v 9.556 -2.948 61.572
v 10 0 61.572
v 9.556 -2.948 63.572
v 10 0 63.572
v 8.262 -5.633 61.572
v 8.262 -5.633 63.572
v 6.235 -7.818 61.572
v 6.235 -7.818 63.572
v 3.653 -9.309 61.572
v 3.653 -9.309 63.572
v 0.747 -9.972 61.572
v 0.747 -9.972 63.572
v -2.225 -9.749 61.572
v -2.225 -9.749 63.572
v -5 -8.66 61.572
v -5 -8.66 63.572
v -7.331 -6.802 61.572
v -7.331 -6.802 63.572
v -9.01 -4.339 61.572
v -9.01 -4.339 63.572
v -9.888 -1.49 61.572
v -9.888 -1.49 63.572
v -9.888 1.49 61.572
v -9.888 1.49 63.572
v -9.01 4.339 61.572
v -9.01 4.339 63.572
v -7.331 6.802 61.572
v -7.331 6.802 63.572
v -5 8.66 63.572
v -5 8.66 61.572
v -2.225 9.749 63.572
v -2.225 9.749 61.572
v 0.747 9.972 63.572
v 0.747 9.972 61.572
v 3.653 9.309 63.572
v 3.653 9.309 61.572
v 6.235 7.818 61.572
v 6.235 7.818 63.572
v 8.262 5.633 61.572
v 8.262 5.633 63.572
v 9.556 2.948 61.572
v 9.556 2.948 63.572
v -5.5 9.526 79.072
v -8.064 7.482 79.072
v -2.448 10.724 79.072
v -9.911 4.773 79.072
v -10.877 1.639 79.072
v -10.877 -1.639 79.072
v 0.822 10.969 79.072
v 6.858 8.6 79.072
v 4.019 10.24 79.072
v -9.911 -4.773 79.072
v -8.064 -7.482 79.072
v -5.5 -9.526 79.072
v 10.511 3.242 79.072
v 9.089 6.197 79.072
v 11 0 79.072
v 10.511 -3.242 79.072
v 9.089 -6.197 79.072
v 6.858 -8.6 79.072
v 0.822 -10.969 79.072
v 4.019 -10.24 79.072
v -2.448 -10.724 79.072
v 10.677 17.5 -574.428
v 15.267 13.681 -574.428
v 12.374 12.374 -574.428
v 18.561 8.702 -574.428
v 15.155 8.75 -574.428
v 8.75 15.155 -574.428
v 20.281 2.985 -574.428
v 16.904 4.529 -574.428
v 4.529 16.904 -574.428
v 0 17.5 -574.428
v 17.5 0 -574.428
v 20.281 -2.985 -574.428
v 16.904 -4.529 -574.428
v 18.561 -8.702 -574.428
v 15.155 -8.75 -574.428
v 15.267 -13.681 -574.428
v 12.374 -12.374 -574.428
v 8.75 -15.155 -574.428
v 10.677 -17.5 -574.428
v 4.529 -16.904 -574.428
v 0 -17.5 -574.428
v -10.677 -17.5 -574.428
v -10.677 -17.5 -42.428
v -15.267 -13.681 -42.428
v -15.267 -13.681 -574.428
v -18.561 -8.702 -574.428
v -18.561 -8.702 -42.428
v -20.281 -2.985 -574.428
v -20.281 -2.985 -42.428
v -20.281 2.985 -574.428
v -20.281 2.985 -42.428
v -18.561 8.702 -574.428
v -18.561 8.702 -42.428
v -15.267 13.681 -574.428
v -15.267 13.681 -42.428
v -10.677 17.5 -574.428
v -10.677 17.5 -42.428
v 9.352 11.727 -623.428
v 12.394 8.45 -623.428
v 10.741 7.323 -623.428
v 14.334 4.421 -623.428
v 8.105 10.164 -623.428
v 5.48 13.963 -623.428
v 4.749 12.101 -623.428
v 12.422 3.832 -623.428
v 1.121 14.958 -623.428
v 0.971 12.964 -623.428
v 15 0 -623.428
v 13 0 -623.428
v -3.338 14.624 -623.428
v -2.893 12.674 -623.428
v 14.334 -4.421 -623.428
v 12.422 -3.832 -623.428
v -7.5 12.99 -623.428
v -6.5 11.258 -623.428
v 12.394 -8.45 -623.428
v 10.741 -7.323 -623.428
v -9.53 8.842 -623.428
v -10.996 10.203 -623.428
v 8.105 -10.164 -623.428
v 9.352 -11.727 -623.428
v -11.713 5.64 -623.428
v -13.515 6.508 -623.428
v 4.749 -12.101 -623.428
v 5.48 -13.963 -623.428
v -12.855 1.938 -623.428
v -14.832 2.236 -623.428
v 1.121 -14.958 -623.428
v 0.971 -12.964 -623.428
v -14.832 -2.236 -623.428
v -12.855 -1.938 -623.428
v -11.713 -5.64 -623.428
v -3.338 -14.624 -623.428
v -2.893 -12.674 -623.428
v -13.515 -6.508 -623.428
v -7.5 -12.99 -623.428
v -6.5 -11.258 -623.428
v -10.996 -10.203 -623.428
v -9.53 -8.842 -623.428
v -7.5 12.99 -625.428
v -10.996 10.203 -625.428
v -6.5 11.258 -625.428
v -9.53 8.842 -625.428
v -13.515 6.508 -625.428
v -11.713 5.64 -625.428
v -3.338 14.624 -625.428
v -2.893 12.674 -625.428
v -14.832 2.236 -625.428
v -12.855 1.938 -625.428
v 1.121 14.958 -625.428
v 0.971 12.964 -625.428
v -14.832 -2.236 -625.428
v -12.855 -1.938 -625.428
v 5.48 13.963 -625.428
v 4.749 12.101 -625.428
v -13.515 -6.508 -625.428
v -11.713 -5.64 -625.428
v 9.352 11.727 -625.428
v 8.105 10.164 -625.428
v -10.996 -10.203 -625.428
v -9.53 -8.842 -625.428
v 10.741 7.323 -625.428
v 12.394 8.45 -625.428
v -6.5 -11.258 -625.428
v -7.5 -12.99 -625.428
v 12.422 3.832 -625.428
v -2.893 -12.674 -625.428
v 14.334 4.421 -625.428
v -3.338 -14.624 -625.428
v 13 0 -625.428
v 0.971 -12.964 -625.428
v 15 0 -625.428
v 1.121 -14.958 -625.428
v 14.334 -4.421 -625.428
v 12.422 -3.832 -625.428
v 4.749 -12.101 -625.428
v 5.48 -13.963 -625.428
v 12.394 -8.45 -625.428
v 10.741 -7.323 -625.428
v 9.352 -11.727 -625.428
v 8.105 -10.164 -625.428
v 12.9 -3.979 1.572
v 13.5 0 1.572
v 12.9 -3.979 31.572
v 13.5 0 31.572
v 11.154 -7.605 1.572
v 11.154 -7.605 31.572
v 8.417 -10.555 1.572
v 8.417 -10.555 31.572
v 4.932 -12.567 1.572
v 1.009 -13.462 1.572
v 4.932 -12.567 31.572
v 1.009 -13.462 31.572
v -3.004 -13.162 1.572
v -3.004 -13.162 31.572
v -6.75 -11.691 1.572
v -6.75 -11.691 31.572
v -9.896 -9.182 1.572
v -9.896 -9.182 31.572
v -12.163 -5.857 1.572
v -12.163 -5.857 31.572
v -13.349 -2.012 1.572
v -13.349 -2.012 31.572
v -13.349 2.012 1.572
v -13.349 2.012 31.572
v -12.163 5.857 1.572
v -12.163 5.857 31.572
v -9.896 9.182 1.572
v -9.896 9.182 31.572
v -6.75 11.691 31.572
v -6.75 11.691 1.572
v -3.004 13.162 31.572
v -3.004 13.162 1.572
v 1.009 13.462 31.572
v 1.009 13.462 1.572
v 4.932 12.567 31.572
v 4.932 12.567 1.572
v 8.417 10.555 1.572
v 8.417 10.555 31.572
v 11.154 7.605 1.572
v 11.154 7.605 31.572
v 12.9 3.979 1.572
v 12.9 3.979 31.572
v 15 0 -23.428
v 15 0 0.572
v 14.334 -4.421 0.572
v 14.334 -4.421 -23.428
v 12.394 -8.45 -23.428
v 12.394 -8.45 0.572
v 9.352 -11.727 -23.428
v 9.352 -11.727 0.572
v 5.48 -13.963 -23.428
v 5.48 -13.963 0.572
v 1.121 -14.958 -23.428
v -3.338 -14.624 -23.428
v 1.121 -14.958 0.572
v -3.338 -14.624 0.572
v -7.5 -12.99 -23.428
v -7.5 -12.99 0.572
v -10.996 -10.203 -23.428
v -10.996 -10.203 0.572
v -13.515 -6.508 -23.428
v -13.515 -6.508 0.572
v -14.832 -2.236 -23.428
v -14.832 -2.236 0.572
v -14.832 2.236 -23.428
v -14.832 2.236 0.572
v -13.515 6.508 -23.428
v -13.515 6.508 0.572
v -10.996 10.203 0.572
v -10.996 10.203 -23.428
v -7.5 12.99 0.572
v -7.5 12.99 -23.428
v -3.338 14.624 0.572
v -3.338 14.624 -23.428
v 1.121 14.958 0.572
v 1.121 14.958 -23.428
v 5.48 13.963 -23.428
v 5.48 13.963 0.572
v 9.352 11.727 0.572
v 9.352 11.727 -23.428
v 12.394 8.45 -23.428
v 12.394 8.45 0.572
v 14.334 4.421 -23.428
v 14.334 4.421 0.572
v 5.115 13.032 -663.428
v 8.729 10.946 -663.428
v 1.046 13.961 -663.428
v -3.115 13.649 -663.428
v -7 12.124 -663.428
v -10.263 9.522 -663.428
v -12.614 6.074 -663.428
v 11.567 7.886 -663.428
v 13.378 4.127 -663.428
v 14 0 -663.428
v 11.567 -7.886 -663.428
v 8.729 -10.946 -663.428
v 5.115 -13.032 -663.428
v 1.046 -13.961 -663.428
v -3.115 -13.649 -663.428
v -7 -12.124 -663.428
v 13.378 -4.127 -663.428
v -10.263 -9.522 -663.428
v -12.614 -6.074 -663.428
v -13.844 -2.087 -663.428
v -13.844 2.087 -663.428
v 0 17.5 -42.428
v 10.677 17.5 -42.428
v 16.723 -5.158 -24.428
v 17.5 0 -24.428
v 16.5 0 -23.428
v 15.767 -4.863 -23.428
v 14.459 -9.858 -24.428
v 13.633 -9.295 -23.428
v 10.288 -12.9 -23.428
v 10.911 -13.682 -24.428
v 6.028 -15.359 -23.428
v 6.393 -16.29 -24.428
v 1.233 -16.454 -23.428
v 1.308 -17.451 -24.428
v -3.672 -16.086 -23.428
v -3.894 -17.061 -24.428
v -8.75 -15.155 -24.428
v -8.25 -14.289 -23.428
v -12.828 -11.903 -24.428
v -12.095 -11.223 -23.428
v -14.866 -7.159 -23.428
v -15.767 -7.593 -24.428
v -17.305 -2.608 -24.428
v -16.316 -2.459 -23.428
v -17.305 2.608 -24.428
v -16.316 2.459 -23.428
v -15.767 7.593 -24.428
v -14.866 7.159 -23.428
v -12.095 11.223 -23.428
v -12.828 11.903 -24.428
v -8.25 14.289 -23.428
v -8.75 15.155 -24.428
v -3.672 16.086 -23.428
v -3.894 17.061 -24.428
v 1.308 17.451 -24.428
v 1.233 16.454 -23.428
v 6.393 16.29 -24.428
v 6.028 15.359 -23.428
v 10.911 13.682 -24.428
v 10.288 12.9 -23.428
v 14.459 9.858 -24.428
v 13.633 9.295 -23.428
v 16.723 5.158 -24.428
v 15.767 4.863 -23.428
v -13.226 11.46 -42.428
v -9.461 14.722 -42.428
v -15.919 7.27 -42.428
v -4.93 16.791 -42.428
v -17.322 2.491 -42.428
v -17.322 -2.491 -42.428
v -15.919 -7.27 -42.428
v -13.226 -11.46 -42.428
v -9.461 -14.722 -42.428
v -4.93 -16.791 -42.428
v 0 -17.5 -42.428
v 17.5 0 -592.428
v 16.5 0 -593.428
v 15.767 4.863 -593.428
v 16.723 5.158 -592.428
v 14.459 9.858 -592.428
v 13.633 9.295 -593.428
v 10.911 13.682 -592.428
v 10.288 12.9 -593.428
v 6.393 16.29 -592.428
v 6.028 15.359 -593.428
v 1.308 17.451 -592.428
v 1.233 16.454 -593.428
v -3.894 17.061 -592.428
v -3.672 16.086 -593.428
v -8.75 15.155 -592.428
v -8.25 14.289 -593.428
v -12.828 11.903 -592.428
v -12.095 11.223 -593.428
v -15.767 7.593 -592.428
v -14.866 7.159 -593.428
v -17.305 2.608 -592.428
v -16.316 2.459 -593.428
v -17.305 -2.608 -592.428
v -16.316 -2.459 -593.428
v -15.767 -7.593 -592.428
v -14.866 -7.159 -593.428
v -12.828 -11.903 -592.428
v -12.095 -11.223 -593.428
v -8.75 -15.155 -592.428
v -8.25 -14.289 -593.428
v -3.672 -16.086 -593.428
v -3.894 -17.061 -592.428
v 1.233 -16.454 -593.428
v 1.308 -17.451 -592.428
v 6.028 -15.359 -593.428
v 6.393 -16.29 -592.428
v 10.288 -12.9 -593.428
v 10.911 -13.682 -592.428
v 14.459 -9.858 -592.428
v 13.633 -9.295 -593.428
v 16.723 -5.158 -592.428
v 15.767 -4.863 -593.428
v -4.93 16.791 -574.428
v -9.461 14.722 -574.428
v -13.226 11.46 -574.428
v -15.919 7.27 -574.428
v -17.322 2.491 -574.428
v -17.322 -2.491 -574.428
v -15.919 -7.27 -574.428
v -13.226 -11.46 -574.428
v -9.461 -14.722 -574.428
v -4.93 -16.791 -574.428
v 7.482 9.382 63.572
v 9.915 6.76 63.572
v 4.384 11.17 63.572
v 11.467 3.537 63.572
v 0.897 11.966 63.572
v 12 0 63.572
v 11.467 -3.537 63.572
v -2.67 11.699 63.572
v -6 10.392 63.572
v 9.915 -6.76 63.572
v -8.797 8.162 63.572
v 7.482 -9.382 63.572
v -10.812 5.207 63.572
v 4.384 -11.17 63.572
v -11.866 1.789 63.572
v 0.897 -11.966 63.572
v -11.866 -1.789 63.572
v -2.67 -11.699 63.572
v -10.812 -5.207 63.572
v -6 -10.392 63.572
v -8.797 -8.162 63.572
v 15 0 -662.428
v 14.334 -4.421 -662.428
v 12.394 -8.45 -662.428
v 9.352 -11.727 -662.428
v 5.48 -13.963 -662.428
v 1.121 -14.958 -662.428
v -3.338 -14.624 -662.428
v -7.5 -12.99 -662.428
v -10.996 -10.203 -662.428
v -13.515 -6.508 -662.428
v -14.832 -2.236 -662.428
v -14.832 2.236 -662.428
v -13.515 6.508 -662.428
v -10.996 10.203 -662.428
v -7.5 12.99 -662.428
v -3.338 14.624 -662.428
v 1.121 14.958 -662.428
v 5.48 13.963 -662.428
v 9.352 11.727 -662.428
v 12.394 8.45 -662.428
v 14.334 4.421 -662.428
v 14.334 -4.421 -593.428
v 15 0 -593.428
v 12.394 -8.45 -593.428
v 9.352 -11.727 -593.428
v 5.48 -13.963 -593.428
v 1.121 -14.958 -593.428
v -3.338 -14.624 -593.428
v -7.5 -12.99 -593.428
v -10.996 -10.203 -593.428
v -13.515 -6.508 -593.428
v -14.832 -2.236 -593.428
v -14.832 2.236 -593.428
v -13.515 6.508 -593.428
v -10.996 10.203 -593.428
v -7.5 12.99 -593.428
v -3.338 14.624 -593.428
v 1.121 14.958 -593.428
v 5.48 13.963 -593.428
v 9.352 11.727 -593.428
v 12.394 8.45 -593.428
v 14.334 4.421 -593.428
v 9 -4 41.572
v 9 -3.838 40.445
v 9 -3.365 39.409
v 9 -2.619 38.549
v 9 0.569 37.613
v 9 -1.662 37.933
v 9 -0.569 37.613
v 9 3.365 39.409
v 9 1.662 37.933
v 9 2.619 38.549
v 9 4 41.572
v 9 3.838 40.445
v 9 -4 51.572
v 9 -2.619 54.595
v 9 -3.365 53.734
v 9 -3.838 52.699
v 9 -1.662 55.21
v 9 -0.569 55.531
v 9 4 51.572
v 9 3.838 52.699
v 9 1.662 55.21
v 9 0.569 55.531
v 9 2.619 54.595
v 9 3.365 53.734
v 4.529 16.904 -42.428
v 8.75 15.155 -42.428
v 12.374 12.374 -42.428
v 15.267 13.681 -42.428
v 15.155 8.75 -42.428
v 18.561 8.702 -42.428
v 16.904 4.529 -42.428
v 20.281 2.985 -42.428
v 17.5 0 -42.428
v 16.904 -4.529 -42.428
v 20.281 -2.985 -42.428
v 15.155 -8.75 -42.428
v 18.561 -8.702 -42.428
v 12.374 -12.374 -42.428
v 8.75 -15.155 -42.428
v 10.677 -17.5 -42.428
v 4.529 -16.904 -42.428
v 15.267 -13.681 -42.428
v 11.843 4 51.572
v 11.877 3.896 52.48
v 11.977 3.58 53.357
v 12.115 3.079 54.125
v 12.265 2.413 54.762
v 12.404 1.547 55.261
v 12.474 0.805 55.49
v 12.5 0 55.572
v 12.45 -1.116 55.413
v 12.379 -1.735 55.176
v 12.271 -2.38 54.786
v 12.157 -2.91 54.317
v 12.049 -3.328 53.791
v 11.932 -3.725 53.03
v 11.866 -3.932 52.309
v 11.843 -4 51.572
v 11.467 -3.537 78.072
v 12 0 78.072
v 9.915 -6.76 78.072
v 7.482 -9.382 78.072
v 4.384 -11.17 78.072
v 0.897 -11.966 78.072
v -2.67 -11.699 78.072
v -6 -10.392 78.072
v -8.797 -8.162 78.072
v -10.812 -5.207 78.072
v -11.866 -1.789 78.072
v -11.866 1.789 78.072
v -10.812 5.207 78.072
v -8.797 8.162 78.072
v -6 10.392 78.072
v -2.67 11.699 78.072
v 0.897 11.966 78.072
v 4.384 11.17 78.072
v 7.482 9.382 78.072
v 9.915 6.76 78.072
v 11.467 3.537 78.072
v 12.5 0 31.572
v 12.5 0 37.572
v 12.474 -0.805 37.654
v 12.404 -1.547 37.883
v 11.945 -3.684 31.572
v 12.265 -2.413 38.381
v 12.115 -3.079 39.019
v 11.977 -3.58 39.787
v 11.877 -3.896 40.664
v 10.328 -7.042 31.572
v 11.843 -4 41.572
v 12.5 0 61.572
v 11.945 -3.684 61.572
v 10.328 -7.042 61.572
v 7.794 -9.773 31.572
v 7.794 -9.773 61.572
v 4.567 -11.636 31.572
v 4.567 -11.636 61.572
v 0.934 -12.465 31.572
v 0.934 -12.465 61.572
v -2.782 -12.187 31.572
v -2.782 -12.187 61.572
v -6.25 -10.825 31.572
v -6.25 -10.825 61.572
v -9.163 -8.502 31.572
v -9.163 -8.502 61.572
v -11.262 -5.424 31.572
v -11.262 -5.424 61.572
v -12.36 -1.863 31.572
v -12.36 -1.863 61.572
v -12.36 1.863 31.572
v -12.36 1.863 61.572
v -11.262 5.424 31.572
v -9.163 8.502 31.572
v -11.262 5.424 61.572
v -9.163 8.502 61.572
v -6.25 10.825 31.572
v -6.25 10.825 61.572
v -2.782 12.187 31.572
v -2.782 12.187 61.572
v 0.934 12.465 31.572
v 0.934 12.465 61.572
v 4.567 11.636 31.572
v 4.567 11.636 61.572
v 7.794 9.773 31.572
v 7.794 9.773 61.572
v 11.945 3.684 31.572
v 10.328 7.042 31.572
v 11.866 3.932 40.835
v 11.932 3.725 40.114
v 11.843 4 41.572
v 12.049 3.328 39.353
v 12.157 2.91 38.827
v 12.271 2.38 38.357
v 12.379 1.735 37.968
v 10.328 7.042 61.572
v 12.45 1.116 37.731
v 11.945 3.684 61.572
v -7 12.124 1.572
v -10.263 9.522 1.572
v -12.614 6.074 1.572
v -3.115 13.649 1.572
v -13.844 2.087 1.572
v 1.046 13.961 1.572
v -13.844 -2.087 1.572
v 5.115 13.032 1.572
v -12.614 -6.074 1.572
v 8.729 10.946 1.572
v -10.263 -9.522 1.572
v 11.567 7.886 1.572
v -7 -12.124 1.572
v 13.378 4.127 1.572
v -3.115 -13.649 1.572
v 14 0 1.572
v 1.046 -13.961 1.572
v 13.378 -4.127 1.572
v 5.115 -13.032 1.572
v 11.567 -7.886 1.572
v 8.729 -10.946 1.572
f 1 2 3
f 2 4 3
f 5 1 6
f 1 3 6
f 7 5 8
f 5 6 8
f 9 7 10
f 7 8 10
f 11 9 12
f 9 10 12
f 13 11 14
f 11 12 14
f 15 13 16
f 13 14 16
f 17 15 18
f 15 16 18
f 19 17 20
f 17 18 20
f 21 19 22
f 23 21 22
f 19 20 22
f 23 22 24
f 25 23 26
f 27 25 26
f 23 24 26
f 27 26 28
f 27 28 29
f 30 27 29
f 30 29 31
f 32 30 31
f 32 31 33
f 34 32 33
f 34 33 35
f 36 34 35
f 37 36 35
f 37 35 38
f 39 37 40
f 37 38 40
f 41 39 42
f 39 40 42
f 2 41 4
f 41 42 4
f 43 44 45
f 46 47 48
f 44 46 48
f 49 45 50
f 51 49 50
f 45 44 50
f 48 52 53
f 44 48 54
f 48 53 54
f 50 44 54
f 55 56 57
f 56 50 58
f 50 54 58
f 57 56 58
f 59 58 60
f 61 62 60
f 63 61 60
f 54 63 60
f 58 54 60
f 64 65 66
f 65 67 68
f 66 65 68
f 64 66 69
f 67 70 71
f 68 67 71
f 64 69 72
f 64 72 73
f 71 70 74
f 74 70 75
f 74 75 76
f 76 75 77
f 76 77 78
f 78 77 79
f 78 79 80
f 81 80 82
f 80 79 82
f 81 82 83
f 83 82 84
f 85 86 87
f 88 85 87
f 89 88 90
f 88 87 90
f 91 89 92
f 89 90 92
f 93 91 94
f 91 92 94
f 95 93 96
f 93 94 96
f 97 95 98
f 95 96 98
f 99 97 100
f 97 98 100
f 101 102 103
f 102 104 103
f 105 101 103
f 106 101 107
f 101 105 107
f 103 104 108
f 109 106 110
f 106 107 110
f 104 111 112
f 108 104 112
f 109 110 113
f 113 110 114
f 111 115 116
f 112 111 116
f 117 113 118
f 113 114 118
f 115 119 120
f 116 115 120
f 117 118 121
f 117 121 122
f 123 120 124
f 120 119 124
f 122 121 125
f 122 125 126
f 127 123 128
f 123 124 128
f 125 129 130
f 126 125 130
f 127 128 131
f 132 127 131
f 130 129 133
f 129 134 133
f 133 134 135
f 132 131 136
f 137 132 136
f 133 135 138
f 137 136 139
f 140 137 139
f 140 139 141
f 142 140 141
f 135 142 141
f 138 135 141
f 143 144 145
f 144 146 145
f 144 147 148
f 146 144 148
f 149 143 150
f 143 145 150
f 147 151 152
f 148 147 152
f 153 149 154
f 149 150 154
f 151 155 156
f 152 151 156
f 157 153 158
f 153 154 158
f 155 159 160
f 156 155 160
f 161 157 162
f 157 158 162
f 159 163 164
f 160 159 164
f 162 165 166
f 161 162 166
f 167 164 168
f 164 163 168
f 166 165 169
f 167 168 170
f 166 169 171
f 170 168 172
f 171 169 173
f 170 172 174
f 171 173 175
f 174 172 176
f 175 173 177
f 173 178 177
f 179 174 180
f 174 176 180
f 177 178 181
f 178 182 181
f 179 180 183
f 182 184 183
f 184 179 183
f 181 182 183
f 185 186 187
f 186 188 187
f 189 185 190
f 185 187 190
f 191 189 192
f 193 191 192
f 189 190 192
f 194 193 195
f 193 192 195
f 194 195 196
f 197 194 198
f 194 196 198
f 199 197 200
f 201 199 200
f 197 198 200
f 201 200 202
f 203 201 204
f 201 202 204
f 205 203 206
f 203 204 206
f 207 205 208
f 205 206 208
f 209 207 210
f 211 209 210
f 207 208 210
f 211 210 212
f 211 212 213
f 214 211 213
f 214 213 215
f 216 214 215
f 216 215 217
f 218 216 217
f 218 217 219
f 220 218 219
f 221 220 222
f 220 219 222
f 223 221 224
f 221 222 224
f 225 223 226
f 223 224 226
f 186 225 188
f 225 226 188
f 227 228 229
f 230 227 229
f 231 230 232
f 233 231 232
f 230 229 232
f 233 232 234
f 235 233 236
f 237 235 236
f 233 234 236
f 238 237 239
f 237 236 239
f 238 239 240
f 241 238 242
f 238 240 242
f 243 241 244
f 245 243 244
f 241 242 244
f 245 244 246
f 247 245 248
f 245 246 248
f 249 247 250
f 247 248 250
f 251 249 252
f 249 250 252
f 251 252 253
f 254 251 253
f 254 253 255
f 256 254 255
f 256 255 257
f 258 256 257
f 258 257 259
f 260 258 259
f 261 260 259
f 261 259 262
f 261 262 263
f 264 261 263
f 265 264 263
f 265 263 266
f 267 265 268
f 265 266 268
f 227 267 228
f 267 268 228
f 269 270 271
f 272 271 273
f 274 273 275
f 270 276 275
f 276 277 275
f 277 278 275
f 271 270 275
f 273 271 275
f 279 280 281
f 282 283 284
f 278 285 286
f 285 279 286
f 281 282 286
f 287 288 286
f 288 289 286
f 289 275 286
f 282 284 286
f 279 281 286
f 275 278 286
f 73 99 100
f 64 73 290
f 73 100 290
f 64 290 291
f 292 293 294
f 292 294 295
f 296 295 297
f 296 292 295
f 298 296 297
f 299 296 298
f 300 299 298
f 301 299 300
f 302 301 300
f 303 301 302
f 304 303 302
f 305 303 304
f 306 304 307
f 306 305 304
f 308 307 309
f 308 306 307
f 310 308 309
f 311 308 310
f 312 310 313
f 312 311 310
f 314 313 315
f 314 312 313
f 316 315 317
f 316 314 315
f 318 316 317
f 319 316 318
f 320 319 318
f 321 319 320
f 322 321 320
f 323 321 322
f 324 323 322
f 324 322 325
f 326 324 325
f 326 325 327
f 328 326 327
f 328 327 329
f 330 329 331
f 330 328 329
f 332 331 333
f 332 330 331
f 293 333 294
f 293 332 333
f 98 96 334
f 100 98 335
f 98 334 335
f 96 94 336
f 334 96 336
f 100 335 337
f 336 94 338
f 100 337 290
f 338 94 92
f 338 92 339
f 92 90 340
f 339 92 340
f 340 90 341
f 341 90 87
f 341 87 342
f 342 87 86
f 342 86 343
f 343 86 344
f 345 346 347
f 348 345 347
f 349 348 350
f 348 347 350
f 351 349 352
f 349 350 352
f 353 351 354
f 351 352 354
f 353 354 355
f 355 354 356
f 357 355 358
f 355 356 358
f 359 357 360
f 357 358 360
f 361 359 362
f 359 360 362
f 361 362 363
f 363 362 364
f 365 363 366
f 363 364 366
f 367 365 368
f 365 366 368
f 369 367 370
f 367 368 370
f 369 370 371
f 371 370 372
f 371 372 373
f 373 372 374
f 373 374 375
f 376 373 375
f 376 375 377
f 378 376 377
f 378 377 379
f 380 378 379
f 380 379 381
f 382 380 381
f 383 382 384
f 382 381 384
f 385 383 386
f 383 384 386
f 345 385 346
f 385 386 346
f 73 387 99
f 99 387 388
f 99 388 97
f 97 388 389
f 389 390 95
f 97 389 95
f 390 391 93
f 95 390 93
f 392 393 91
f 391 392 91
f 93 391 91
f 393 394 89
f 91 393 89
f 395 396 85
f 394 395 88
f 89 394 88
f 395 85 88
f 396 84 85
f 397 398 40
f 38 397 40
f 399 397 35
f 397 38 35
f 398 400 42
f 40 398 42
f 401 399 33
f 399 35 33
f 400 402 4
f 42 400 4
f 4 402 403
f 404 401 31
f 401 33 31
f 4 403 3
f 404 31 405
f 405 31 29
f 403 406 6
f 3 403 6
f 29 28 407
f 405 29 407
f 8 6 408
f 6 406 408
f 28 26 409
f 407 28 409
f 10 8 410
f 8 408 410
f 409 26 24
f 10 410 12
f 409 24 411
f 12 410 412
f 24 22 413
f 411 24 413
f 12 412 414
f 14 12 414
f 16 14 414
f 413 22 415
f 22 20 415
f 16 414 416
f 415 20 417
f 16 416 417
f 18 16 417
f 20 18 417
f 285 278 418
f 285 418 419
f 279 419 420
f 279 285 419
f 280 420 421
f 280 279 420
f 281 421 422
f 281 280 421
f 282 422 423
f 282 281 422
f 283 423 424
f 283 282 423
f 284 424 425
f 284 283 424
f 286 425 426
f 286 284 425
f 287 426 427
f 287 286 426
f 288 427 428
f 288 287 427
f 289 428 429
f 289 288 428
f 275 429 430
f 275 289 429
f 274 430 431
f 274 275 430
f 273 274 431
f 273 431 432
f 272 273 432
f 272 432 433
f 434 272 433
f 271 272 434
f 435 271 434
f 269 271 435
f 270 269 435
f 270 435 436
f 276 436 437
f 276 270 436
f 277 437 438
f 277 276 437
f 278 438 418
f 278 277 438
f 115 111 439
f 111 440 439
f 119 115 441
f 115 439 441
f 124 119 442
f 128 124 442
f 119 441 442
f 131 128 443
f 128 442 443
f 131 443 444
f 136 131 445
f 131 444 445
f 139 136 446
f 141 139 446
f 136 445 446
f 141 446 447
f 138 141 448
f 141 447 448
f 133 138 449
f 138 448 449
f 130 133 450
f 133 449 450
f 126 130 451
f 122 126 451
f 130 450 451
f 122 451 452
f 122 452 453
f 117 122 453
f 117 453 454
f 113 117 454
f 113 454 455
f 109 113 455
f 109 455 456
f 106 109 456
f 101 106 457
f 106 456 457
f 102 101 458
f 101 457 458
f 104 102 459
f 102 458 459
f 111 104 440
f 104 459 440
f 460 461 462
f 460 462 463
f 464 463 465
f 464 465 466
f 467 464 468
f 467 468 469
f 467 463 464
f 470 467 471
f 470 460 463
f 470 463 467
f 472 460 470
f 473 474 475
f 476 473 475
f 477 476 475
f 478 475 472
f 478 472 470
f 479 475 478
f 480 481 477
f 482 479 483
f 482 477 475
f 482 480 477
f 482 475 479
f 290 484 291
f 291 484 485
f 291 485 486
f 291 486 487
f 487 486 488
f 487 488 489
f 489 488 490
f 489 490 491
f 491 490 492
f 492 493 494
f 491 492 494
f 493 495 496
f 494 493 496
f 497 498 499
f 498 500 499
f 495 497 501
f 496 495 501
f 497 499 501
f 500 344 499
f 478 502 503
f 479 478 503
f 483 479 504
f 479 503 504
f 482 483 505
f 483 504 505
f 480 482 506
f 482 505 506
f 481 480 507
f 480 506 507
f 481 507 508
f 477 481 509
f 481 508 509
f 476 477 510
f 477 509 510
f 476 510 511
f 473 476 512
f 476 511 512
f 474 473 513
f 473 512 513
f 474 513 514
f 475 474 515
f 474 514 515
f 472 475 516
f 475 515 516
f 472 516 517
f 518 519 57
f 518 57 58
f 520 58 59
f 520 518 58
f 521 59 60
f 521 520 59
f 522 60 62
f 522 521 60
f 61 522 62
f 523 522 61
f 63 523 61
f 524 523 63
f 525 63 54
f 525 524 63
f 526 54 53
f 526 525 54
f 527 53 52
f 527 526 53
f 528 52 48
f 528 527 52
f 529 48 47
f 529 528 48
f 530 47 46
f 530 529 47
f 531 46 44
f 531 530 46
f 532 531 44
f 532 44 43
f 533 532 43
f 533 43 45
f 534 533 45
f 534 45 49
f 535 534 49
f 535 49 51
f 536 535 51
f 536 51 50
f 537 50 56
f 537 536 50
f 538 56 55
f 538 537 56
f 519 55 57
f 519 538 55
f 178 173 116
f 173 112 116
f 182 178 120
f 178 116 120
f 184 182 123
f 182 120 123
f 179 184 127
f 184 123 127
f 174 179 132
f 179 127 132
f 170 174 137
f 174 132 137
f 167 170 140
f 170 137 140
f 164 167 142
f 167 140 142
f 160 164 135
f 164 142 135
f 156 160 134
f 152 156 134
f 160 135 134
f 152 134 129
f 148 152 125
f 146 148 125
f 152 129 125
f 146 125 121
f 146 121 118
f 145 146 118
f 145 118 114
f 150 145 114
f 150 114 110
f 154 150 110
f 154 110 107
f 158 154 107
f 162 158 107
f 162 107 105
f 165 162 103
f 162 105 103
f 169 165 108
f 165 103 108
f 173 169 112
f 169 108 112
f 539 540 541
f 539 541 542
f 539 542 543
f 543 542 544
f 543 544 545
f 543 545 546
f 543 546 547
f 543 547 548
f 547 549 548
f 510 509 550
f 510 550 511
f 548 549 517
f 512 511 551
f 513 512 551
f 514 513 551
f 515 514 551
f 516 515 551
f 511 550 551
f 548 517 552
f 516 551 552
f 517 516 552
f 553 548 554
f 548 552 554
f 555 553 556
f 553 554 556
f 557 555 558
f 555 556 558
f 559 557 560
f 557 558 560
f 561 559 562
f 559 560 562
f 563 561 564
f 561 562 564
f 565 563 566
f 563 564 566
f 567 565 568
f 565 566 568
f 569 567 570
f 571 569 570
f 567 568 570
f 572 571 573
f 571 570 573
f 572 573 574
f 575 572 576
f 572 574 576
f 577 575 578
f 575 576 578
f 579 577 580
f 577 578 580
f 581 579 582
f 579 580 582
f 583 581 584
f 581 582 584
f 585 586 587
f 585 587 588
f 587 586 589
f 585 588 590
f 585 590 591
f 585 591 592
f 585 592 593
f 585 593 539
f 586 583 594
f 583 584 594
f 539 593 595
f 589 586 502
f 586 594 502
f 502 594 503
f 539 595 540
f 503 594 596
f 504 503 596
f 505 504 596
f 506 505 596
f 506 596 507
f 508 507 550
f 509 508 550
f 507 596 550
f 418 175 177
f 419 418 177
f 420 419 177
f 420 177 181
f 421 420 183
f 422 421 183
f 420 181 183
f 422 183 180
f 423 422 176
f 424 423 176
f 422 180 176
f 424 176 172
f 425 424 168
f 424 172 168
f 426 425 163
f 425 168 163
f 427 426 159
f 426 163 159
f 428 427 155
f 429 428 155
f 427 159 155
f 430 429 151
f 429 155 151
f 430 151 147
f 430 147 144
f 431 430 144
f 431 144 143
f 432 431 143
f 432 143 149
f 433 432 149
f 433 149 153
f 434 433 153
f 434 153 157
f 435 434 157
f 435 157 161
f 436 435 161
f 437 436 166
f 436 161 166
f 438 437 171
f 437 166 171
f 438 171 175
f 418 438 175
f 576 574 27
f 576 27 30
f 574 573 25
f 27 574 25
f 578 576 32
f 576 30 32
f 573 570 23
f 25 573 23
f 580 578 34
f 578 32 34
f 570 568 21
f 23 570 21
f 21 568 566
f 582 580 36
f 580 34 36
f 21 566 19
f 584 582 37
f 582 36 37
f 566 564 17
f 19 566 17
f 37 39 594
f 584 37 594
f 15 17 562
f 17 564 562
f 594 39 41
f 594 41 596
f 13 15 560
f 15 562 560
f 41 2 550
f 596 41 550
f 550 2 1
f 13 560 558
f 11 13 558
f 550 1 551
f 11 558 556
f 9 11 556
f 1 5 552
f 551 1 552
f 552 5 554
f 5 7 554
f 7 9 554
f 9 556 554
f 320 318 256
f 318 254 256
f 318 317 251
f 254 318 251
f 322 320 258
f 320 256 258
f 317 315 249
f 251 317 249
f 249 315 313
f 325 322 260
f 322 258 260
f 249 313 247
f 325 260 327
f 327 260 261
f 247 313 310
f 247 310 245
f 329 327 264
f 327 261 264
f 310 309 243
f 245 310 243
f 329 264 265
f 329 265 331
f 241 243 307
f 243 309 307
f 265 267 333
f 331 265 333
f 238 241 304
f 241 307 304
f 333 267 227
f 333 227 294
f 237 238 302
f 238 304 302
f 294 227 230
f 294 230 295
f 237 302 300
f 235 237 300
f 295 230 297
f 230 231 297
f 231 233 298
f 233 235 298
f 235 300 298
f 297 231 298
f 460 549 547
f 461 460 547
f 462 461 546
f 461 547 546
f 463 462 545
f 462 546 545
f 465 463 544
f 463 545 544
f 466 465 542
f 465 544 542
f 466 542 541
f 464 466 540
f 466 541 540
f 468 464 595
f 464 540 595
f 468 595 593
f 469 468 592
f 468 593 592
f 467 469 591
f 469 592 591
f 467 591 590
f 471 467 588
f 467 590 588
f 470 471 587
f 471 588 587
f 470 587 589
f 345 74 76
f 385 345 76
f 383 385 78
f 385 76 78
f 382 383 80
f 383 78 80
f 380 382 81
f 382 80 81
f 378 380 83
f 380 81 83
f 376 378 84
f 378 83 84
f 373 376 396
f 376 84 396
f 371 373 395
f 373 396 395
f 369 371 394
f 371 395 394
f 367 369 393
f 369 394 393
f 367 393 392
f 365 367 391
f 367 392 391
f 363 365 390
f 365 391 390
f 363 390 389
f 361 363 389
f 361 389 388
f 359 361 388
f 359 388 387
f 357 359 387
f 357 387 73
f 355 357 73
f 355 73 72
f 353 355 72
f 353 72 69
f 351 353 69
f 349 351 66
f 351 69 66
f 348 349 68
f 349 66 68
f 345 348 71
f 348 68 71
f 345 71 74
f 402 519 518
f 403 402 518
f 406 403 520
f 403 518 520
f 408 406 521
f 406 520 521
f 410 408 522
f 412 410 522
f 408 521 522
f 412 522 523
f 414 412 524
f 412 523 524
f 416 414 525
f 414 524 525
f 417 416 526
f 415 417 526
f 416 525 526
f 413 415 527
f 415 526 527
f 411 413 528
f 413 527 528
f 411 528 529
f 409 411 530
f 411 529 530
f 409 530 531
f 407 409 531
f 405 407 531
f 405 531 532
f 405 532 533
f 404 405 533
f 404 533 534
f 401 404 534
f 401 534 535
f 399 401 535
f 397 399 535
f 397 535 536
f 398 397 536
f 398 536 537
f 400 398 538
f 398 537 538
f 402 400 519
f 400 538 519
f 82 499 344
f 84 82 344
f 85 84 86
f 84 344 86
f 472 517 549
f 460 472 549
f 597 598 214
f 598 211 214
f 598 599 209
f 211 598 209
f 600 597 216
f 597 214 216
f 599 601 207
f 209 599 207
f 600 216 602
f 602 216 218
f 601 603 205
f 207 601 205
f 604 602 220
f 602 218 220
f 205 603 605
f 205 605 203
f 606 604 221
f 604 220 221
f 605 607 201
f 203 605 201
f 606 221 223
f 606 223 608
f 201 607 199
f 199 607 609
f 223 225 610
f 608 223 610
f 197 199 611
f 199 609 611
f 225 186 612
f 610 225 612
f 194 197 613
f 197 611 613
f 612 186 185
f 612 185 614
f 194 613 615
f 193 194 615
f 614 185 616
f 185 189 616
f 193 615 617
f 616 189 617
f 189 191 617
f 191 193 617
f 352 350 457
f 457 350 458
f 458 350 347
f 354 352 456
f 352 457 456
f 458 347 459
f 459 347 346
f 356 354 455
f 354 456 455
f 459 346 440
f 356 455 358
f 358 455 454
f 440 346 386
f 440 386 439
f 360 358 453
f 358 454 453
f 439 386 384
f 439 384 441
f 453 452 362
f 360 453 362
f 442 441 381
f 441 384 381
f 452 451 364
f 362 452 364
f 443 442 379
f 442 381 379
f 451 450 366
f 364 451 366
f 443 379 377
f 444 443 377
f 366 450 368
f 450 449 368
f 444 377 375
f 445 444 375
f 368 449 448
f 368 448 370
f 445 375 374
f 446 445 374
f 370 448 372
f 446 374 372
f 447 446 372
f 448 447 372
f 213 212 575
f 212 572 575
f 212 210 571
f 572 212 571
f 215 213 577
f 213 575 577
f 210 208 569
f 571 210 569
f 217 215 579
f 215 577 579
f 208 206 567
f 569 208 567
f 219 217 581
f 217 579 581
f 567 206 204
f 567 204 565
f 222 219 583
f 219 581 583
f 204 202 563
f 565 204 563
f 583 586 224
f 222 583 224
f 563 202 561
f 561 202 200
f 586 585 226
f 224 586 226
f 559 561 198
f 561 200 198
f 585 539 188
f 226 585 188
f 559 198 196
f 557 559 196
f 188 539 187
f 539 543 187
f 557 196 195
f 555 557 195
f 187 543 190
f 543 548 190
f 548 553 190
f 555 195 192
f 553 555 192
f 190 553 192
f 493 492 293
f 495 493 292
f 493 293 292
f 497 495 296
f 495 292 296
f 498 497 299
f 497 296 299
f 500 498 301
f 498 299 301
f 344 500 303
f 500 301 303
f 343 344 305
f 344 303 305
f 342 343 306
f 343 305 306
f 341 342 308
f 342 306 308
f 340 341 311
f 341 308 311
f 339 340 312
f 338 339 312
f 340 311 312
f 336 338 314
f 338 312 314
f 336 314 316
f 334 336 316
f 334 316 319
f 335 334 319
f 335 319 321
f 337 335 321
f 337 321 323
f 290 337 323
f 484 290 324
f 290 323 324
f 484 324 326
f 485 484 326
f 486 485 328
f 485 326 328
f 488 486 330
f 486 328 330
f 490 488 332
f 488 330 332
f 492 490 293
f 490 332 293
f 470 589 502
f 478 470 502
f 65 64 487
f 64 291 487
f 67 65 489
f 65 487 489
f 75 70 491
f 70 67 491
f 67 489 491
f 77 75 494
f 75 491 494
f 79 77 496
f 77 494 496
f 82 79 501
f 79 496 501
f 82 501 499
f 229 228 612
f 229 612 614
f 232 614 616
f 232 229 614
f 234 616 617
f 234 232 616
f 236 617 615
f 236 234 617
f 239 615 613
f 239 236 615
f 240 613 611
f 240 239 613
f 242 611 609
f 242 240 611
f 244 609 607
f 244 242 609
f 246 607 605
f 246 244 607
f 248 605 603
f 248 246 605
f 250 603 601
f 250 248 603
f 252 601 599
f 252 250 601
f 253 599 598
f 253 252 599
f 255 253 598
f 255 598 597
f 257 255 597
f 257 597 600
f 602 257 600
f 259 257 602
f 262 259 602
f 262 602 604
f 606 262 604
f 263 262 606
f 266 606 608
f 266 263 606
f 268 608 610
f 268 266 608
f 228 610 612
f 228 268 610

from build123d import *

# Parameters (mm, degrees)
F3_DEPTH = 621.001
F4_SIZE  = 1
F7_DEPTH = 6


with BuildPart() as f1:
    # F0 (on Front) → F1 (revolve)
    with BuildSketch(Plane.XZ):
        Polygon((12, 79.071932), (0, 79.071932), (0, -663.428068), (15, -663.428068), (15, -625.428068), (13, -625.428068), (13, -623.428068), (15, -623.428068), (15, -593.428068), (17.5, -593.428068), (17.5, -574.428068), (20.5, -574.428068), (20.5, -42.428068), (17.5, -42.428068), (17.5, -23.428068), (15, -23.428068), (15, 1.571932), (13.5, 1.571932), (13.5, 31.571932), (12.5, 31.571932), (12.5, 61.571932), (10, 61.571932), (10, 63.571932), (12, 63.571932), align=None)
    revolve(axis=Axis((0, 0, -292.178068), (0, 0, -1)))

    # F2 (on face) → F3 (cut, through all)
    with BuildSketch(Plane.XY.offset(-42.428068)):
        with BuildLine():
            ThreePointArc((10.677078, 17.5), (0, 20.5), (-10.677078, 17.5))
            Line((-10.677078, 17.5), (0, 17.5))
            Line((0, 17.5), (10.677078, 17.5))
        make_face()
        with BuildLine():
            Line((0, -17.5), (-10.677078, -17.5))
            ThreePointArc((-10.677078, -17.5), (0, -20.5), (10.677078, -17.5))
            Line((10.677078, -17.5), (0, -17.5))
        make_face()
    extrude(amount=-F3_DEPTH, mode=Mode.SUBTRACT)

    # F4
    f4_edges = [f1.edges().sort_by_distance(p)[0] for p in [
        (-15, 0, -663.428068),
        (-17.5, 0, -593.428068),
        (-12, 0, 79.071932),
        (-15, 0, 1.571932),
        (-17.5, 0, -23.428068),
    ]]
    chamfer(f4_edges, length=F4_SIZE)

    # F6 (on offset) → F7 (cut)
    with BuildSketch(Plane.YZ.offset(15)):
        with BuildLine():
            ThreePointArc((4, 51.571932), (0, 55.571932), (-4, 51.571932))
            Line((-4, 51.571932), (-4, 41.571932))
            ThreePointArc((-4, 41.571932), (0, 37.571932), (4, 41.571932))
            Line((4, 41.571932), (4, 51.571932))
        make_face()
    extrude(amount=-F7_DEPTH, mode=Mode.SUBTRACT)


solid = f1.part
